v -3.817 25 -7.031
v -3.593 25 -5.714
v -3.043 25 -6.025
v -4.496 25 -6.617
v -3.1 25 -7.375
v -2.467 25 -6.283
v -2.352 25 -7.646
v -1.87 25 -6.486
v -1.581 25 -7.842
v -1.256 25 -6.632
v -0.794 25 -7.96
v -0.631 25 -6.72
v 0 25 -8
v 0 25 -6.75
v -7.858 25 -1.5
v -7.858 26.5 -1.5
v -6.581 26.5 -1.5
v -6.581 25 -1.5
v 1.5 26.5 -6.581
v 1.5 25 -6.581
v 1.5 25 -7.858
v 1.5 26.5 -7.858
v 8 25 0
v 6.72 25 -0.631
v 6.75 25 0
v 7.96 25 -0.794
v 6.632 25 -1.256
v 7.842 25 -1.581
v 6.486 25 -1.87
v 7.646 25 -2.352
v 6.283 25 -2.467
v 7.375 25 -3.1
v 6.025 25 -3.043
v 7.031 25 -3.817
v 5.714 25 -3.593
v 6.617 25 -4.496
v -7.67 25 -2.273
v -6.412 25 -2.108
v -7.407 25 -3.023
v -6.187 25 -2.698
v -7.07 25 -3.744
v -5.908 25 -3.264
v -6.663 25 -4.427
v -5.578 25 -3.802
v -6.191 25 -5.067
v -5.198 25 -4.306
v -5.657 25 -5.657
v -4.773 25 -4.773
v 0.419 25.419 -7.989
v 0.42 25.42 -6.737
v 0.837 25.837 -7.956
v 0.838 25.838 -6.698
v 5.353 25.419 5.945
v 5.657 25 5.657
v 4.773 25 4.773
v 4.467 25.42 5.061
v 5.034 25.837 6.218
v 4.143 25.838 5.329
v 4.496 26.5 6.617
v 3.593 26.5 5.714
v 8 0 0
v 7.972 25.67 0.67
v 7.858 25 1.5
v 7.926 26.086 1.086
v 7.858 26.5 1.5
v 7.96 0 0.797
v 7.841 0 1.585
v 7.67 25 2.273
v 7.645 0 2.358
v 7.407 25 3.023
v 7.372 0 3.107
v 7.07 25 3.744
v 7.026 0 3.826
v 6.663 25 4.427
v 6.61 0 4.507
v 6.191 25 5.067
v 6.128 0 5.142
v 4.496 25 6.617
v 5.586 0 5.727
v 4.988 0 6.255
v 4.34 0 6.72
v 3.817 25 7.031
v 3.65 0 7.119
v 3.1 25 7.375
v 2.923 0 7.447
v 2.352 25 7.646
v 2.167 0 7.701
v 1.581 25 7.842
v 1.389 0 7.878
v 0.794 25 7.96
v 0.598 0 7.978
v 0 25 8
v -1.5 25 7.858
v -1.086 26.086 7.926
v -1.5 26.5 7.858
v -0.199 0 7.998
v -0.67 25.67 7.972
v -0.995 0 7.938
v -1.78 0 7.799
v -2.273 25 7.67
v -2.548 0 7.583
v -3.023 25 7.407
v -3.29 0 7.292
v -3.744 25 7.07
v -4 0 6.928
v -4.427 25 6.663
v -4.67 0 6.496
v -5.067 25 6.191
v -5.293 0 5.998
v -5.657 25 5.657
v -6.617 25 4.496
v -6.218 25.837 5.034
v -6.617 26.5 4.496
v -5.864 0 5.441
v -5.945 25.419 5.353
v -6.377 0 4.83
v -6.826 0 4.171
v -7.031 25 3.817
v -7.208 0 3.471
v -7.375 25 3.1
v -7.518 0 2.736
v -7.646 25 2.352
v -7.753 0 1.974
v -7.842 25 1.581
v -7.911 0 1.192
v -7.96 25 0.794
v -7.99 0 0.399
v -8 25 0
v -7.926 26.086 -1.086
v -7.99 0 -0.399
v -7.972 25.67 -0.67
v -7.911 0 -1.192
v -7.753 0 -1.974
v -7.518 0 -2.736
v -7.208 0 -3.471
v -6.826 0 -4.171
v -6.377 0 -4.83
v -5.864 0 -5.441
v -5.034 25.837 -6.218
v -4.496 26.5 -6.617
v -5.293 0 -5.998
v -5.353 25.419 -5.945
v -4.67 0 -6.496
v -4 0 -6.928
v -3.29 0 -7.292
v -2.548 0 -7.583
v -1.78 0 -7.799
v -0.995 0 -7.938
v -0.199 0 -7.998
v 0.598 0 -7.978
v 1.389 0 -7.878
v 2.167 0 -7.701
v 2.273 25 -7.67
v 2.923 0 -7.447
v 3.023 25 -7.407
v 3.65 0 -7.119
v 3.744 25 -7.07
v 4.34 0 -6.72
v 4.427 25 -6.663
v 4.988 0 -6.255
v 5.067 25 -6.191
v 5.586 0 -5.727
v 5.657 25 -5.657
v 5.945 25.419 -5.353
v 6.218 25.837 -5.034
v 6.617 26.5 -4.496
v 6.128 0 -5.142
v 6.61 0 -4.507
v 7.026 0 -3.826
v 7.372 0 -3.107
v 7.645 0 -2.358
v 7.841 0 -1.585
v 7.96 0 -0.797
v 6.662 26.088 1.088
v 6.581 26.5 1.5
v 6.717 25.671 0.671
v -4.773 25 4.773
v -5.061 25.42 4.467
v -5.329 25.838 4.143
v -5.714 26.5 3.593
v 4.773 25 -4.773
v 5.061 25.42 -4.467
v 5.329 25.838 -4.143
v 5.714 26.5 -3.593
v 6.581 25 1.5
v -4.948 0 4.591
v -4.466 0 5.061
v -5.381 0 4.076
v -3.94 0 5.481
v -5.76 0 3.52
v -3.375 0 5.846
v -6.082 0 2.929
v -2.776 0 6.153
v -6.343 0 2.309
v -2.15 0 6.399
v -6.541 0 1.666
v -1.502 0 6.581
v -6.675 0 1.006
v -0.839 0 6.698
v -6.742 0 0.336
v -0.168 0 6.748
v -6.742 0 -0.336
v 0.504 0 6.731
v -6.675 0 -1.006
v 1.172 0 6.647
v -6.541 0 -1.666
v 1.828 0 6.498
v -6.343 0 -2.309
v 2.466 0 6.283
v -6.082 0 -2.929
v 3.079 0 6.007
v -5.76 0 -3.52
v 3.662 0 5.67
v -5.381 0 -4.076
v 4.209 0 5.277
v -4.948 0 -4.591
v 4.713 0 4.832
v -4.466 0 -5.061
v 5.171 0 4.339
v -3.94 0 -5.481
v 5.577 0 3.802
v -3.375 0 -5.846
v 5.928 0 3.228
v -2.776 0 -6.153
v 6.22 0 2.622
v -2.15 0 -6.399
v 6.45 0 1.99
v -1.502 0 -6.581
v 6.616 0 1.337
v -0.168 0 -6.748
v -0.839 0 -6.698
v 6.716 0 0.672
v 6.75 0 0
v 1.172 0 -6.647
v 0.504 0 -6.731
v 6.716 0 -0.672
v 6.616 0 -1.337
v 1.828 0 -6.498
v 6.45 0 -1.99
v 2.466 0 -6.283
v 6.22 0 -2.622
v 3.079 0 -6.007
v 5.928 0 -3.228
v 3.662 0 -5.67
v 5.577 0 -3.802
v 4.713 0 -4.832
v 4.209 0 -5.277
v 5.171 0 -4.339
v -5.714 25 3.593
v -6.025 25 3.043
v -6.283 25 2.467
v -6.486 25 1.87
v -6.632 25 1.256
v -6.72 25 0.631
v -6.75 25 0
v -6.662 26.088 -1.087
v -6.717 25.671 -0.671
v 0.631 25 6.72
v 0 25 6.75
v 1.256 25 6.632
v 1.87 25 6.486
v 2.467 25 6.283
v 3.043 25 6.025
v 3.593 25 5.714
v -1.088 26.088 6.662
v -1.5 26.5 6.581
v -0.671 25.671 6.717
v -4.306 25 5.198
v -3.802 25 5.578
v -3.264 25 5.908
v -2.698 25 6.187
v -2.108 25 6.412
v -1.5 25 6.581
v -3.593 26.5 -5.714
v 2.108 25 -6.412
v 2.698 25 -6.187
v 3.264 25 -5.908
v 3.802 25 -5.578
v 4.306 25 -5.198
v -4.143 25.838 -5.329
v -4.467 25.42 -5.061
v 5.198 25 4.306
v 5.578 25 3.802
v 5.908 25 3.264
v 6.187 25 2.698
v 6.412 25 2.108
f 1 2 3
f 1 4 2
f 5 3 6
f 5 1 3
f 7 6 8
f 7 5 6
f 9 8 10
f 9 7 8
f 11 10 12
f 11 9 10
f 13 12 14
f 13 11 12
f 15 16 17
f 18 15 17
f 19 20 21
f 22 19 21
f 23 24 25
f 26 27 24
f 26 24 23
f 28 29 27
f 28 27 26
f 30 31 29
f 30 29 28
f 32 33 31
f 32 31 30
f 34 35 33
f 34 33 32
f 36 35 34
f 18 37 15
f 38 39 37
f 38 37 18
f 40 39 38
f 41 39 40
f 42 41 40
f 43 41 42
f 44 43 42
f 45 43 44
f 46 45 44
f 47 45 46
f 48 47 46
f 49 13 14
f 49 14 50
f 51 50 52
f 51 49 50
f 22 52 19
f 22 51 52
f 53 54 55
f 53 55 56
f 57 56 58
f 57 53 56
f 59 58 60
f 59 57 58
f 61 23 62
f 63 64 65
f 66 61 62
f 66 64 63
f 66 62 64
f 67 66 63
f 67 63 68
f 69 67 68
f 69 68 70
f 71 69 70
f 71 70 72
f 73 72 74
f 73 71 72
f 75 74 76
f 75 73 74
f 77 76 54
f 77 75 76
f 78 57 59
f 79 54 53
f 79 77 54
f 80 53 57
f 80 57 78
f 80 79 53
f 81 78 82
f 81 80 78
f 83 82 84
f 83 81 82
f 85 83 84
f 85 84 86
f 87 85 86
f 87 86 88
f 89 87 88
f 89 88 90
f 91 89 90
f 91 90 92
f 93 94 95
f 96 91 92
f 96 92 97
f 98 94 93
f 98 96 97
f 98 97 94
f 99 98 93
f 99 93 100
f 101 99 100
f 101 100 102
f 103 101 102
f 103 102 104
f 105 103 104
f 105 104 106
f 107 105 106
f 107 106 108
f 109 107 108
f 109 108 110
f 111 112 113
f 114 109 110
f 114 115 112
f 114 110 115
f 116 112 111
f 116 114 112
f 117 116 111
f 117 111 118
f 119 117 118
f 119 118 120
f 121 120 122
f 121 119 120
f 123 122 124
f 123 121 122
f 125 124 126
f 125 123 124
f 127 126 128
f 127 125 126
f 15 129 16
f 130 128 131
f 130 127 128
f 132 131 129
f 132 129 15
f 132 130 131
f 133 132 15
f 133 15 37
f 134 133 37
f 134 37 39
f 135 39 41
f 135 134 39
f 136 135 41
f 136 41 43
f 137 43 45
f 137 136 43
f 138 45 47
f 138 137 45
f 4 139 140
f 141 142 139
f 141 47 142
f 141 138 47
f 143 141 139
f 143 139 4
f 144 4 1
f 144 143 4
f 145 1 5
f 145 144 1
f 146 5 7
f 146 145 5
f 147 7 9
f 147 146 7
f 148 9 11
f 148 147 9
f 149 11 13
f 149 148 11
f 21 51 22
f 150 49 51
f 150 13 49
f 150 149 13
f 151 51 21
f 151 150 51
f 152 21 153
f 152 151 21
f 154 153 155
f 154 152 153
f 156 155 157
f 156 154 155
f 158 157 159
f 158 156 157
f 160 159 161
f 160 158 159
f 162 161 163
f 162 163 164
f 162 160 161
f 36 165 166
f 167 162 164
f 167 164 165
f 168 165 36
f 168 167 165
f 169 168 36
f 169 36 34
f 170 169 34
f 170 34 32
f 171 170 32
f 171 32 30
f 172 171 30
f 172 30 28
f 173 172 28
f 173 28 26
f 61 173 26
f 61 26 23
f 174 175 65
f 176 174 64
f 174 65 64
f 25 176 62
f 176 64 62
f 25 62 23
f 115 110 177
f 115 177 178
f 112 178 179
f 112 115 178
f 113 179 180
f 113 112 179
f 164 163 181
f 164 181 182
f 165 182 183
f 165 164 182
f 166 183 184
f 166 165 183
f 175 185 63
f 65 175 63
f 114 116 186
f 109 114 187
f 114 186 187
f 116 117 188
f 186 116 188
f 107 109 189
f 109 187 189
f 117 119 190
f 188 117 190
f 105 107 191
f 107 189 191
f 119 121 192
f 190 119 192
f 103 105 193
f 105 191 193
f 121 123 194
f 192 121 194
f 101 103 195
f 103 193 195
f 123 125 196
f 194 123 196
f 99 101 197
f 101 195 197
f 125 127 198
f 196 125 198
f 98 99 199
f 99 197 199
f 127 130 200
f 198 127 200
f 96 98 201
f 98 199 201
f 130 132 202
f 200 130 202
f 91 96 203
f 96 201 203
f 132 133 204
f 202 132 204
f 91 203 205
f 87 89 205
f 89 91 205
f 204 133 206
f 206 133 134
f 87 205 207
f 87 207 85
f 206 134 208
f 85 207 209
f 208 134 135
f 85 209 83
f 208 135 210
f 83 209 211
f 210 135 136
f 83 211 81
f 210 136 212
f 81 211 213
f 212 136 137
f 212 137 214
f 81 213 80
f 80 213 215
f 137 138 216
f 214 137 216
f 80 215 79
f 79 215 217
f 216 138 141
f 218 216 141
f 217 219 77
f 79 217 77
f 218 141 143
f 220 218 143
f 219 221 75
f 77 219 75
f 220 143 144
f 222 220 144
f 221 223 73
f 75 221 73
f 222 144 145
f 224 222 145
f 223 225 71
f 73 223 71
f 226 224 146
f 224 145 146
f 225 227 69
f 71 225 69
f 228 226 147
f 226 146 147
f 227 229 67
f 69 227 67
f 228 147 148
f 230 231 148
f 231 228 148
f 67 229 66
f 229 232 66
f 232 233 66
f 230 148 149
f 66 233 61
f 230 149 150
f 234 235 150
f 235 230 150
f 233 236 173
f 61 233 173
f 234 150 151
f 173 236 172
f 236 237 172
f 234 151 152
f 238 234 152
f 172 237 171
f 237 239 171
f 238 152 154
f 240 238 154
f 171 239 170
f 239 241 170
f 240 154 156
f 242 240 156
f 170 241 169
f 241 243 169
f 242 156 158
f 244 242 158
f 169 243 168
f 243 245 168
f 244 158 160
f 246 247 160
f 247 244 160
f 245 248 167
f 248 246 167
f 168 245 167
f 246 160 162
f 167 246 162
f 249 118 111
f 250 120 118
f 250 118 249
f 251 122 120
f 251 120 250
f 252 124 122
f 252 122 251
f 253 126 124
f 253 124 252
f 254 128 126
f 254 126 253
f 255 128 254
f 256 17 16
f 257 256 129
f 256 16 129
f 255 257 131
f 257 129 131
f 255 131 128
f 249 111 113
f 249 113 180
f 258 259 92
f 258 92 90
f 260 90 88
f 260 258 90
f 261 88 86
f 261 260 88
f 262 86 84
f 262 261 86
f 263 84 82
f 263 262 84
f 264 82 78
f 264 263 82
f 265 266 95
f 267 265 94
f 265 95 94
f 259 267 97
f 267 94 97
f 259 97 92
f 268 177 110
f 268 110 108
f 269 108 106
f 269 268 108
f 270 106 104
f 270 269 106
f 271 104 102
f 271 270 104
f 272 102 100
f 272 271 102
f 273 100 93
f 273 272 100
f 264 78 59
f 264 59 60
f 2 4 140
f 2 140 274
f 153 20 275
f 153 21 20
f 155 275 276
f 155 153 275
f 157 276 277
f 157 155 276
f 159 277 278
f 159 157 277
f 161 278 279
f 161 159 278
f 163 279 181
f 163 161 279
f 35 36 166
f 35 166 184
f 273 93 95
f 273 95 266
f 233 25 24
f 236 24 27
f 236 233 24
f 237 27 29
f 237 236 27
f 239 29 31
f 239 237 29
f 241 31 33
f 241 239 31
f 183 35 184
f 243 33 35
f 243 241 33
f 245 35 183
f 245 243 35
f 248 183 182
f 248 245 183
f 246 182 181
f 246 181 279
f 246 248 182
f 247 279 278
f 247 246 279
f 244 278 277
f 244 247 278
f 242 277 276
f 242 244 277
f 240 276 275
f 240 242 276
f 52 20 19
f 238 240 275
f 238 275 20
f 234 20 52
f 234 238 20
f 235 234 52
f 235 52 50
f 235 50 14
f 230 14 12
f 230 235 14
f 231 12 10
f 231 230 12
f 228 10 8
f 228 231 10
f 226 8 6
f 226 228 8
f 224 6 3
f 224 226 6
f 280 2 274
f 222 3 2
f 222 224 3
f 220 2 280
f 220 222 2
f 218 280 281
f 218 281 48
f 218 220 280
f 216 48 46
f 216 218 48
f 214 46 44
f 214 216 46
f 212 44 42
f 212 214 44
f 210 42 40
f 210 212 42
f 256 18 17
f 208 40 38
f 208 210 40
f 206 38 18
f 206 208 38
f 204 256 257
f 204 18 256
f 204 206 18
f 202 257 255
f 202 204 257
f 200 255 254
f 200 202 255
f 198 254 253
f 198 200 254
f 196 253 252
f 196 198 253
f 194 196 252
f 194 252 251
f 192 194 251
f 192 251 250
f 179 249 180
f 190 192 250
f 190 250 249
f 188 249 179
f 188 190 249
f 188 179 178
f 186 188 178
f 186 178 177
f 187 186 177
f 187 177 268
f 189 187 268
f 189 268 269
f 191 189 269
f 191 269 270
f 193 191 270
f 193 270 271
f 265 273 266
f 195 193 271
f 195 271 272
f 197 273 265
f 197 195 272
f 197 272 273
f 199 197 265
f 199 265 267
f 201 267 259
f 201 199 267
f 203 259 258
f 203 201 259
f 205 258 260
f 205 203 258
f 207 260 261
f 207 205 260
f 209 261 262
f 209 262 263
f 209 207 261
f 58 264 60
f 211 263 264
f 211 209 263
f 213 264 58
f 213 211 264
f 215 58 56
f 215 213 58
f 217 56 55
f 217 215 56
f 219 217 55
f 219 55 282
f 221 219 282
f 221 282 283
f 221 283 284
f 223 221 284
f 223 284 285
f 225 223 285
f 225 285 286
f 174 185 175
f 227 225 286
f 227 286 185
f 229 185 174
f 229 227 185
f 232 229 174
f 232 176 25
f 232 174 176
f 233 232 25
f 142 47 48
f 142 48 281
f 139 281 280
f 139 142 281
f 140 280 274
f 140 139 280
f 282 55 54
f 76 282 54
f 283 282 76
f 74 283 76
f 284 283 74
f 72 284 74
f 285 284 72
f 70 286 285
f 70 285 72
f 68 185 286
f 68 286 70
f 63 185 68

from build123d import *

# Parameters (mm, degrees)
SKETCH1_R           = 8.25
SKETCH1_R_2         = 6.75
BOSS_EXTRUDE1_DEPTH = 25
SKETCH2_W           = 1.5
SKETCH2_H           = 1.75
SKETCH2_W_2         = 1.75
SKETCH2_H_2         = 1.5
SKETCH2_H_3         = 1.499622071
BOSS_EXTRUDE2_DEPTH = 1.5
CUT_EXTRUDE1_DEPTH  = 2.5
CUT_EXTRUDE2_DEPTH  = 2.5
CUT_EXTRUDE3_DEPTH  = 2.5
CUT_EXTRUDE4_DEPTH  = 2.5
SKETCH9_R           = 6.625
CUT_EXTRUDE7_DEPTH  = 2.5
CUT_EXTRUDE10_DEPTH = 20.91726189
CUT_EXTRUDE11_DEPTH = 20.91726189
CUT_EXTRUDE12_DEPTH = 20.91726189
CUT_EXTRUDE13_DEPTH = 20.91726189
SKETCH15_R          = 10.332276799
SKETCH15_R_2        = 8
CUT_EXTRUDE14_DEPTH = 35
SKETCH16_R          = 6.75
CUT_EXTRUDE15_DEPTH = 40


with BuildPart() as part:
    # Sketch1 → Boss-Extrude1 (new body)
    with BuildSketch(Plane(origin=(0, 0, 0), x_dir=(1, 0, 0), z_dir=(0, 1, 0))):
        Circle(SKETCH1_R)
        Circle(SKETCH1_R_2, mode=Mode.SUBTRACT)
    extrude(amount=BOSS_EXTRUDE1_DEPTH)

    # Sketch2 → Boss-Extrude2 (add)
    with BuildSketch(Plane(origin=(0, 25, 0), x_dir=(1, 0, 0), z_dir=(0, 1, 0))):
        with Locations((0.75, 7.375)):
            Rectangle(SKETCH2_W, SKETCH2_H)
        with Locations((7.375, -0.75)):
            Rectangle(SKETCH2_W_2, SKETCH2_H_2)
        with Locations((-0.75, -7.375)):
            Rectangle(SKETCH2_W, SKETCH2_H)
        with Locations((-7.375, 0.749811036)):
            Rectangle(SKETCH2_W_2, SKETCH2_H_3)
        Polygon((-5.833630945, 5.833630945), (-4.772970773, 6.894291117), (-3.535533906, 5.656854249), (-4.596194078, 4.596194078), align=None)
        Polygon((5.833630945, 5.833630945), (6.894291117, 4.772970773), (5.656854249, 3.535533906), (4.596194078, 4.596194078), align=None)
        Polygon((5.833630945, -5.833630945), (4.772970773, -6.894291117), (3.535533906, -5.656854249), (4.596194078, -4.596194078), align=None)
        Polygon((-5.833630945, -5.833630945), (-6.894291117, -4.772970773), (-5.656854249, -3.535533906), (-4.596194078, -4.596194078), align=None)
    extrude(amount=BOSS_EXTRUDE2_DEPTH)

    # Sketch5 → Cut-Extrude1 (cut)
    with BuildSketch(Plane.XY.offset(8.25)):
        Polygon((-1.5, 26.5), (0, 25), (0, 26.5), align=None)
    extrude(amount=-CUT_EXTRUDE1_DEPTH, mode=Mode.SUBTRACT)

    # Sketch6 → Cut-Extrude2 (cut)
    with BuildSketch(Plane.ZY.offset(8.25)):
        Polygon((0, 26.5), (-1.499622071, 26.5), (0, 25), align=None)
    extrude(amount=-CUT_EXTRUDE2_DEPTH, mode=Mode.SUBTRACT)

    # Sketch7 → Cut-Extrude3 (cut)
    with BuildSketch(Plane(origin=(0, 0, -8.25), x_dir=(-1, 0, 0), z_dir=(0, 0, -1))):
        Polygon((-1.5, 26.5), (0, 26.5), (0, 25), align=None)
    extrude(amount=-CUT_EXTRUDE3_DEPTH, mode=Mode.SUBTRACT)

    # Sketch8 → Cut-Extrude4 (cut)
    with BuildSketch(Plane(origin=(8.25, 0, 0), x_dir=(0, 0, -1), z_dir=(1, 0, 0))):
        Polygon((0, 26.5), (-1.5, 26.5), (0, 25), align=None)
    extrude(amount=-CUT_EXTRUDE4_DEPTH, mode=Mode.SUBTRACT)

    # Sketch9 → Cut-Extrude7 (cut)
    with BuildSketch(Plane(origin=(0, 25, 0), x_dir=(1, 0, 0), z_dir=(0, 1, 0))):
        Circle(SKETCH9_R)
    extrude(amount=CUT_EXTRUDE7_DEPTH, mode=Mode.SUBTRACT)

    # Sketch11 → Cut-Extrude10 (cut, through all)
    with BuildSketch(Plane(origin=(-5.833630945, 0, 5.833630945), x_dir=(0.707106781, 0, 0.707106781), z_dir=(-0.707106781, 0, 0.707106781))):
        Polygon((0, 25), (-1.5, 26.5), (0, 26.5), align=None)
    extrude(amount=-CUT_EXTRUDE10_DEPTH, mode=Mode.SUBTRACT)

    # Sketch12 → Cut-Extrude11 (cut, through all)
    with BuildSketch(Plane(origin=(-5.833630945, 0, -5.833630945), x_dir=(-0.707106781, 0, 0.707106781), z_dir=(-0.707106781, 0, -0.707106781))):
        Polygon((0, 25), (-1.5, 26.5), (0, 26.5), align=None)
    extrude(amount=-CUT_EXTRUDE11_DEPTH, mode=Mode.SUBTRACT)

    # Sketch13 → Cut-Extrude12 (cut, through all)
    with BuildSketch(Plane(origin=(5.833630945, 0, -5.833630945), x_dir=(-0.707106781, 0, -0.707106781), z_dir=(0.707106781, 0, -0.707106781))):
        Polygon((0, 25), (-1.5, 26.5), (0, 26.5), align=None)
    extrude(amount=-CUT_EXTRUDE12_DEPTH, mode=Mode.SUBTRACT)

    # Sketch14 → Cut-Extrude13 (cut, through all)
    with BuildSketch(Plane(origin=(5.833630945, 0, 5.833630945), x_dir=(0.707106781, 0, -0.707106781), z_dir=(0.707106781, 0, 0.707106781))):
        Polygon((0, 25), (-1.5, 26.5), (0, 26.5), align=None)
    extrude(amount=-CUT_EXTRUDE13_DEPTH, mode=Mode.SUBTRACT)

    # Sketch15 → Cut-Extrude14 (cut)
    with BuildSketch(Plane.XZ):
        Circle(SKETCH15_R)
        Circle(SKETCH15_R_2, mode=Mode.SUBTRACT)
    extrude(amount=-CUT_EXTRUDE14_DEPTH, mode=Mode.SUBTRACT)

    # Sketch16 → Cut-Extrude15 (cut)
    with BuildSketch(Plane(origin=(0, 0, 0), x_dir=(1, 0, 0), z_dir=(0, 1, 0))):
        Circle(SKETCH16_R)
    extrude(amount=CUT_EXTRUDE15_DEPTH, mode=Mode.SUBTRACT)


solid = part.part
